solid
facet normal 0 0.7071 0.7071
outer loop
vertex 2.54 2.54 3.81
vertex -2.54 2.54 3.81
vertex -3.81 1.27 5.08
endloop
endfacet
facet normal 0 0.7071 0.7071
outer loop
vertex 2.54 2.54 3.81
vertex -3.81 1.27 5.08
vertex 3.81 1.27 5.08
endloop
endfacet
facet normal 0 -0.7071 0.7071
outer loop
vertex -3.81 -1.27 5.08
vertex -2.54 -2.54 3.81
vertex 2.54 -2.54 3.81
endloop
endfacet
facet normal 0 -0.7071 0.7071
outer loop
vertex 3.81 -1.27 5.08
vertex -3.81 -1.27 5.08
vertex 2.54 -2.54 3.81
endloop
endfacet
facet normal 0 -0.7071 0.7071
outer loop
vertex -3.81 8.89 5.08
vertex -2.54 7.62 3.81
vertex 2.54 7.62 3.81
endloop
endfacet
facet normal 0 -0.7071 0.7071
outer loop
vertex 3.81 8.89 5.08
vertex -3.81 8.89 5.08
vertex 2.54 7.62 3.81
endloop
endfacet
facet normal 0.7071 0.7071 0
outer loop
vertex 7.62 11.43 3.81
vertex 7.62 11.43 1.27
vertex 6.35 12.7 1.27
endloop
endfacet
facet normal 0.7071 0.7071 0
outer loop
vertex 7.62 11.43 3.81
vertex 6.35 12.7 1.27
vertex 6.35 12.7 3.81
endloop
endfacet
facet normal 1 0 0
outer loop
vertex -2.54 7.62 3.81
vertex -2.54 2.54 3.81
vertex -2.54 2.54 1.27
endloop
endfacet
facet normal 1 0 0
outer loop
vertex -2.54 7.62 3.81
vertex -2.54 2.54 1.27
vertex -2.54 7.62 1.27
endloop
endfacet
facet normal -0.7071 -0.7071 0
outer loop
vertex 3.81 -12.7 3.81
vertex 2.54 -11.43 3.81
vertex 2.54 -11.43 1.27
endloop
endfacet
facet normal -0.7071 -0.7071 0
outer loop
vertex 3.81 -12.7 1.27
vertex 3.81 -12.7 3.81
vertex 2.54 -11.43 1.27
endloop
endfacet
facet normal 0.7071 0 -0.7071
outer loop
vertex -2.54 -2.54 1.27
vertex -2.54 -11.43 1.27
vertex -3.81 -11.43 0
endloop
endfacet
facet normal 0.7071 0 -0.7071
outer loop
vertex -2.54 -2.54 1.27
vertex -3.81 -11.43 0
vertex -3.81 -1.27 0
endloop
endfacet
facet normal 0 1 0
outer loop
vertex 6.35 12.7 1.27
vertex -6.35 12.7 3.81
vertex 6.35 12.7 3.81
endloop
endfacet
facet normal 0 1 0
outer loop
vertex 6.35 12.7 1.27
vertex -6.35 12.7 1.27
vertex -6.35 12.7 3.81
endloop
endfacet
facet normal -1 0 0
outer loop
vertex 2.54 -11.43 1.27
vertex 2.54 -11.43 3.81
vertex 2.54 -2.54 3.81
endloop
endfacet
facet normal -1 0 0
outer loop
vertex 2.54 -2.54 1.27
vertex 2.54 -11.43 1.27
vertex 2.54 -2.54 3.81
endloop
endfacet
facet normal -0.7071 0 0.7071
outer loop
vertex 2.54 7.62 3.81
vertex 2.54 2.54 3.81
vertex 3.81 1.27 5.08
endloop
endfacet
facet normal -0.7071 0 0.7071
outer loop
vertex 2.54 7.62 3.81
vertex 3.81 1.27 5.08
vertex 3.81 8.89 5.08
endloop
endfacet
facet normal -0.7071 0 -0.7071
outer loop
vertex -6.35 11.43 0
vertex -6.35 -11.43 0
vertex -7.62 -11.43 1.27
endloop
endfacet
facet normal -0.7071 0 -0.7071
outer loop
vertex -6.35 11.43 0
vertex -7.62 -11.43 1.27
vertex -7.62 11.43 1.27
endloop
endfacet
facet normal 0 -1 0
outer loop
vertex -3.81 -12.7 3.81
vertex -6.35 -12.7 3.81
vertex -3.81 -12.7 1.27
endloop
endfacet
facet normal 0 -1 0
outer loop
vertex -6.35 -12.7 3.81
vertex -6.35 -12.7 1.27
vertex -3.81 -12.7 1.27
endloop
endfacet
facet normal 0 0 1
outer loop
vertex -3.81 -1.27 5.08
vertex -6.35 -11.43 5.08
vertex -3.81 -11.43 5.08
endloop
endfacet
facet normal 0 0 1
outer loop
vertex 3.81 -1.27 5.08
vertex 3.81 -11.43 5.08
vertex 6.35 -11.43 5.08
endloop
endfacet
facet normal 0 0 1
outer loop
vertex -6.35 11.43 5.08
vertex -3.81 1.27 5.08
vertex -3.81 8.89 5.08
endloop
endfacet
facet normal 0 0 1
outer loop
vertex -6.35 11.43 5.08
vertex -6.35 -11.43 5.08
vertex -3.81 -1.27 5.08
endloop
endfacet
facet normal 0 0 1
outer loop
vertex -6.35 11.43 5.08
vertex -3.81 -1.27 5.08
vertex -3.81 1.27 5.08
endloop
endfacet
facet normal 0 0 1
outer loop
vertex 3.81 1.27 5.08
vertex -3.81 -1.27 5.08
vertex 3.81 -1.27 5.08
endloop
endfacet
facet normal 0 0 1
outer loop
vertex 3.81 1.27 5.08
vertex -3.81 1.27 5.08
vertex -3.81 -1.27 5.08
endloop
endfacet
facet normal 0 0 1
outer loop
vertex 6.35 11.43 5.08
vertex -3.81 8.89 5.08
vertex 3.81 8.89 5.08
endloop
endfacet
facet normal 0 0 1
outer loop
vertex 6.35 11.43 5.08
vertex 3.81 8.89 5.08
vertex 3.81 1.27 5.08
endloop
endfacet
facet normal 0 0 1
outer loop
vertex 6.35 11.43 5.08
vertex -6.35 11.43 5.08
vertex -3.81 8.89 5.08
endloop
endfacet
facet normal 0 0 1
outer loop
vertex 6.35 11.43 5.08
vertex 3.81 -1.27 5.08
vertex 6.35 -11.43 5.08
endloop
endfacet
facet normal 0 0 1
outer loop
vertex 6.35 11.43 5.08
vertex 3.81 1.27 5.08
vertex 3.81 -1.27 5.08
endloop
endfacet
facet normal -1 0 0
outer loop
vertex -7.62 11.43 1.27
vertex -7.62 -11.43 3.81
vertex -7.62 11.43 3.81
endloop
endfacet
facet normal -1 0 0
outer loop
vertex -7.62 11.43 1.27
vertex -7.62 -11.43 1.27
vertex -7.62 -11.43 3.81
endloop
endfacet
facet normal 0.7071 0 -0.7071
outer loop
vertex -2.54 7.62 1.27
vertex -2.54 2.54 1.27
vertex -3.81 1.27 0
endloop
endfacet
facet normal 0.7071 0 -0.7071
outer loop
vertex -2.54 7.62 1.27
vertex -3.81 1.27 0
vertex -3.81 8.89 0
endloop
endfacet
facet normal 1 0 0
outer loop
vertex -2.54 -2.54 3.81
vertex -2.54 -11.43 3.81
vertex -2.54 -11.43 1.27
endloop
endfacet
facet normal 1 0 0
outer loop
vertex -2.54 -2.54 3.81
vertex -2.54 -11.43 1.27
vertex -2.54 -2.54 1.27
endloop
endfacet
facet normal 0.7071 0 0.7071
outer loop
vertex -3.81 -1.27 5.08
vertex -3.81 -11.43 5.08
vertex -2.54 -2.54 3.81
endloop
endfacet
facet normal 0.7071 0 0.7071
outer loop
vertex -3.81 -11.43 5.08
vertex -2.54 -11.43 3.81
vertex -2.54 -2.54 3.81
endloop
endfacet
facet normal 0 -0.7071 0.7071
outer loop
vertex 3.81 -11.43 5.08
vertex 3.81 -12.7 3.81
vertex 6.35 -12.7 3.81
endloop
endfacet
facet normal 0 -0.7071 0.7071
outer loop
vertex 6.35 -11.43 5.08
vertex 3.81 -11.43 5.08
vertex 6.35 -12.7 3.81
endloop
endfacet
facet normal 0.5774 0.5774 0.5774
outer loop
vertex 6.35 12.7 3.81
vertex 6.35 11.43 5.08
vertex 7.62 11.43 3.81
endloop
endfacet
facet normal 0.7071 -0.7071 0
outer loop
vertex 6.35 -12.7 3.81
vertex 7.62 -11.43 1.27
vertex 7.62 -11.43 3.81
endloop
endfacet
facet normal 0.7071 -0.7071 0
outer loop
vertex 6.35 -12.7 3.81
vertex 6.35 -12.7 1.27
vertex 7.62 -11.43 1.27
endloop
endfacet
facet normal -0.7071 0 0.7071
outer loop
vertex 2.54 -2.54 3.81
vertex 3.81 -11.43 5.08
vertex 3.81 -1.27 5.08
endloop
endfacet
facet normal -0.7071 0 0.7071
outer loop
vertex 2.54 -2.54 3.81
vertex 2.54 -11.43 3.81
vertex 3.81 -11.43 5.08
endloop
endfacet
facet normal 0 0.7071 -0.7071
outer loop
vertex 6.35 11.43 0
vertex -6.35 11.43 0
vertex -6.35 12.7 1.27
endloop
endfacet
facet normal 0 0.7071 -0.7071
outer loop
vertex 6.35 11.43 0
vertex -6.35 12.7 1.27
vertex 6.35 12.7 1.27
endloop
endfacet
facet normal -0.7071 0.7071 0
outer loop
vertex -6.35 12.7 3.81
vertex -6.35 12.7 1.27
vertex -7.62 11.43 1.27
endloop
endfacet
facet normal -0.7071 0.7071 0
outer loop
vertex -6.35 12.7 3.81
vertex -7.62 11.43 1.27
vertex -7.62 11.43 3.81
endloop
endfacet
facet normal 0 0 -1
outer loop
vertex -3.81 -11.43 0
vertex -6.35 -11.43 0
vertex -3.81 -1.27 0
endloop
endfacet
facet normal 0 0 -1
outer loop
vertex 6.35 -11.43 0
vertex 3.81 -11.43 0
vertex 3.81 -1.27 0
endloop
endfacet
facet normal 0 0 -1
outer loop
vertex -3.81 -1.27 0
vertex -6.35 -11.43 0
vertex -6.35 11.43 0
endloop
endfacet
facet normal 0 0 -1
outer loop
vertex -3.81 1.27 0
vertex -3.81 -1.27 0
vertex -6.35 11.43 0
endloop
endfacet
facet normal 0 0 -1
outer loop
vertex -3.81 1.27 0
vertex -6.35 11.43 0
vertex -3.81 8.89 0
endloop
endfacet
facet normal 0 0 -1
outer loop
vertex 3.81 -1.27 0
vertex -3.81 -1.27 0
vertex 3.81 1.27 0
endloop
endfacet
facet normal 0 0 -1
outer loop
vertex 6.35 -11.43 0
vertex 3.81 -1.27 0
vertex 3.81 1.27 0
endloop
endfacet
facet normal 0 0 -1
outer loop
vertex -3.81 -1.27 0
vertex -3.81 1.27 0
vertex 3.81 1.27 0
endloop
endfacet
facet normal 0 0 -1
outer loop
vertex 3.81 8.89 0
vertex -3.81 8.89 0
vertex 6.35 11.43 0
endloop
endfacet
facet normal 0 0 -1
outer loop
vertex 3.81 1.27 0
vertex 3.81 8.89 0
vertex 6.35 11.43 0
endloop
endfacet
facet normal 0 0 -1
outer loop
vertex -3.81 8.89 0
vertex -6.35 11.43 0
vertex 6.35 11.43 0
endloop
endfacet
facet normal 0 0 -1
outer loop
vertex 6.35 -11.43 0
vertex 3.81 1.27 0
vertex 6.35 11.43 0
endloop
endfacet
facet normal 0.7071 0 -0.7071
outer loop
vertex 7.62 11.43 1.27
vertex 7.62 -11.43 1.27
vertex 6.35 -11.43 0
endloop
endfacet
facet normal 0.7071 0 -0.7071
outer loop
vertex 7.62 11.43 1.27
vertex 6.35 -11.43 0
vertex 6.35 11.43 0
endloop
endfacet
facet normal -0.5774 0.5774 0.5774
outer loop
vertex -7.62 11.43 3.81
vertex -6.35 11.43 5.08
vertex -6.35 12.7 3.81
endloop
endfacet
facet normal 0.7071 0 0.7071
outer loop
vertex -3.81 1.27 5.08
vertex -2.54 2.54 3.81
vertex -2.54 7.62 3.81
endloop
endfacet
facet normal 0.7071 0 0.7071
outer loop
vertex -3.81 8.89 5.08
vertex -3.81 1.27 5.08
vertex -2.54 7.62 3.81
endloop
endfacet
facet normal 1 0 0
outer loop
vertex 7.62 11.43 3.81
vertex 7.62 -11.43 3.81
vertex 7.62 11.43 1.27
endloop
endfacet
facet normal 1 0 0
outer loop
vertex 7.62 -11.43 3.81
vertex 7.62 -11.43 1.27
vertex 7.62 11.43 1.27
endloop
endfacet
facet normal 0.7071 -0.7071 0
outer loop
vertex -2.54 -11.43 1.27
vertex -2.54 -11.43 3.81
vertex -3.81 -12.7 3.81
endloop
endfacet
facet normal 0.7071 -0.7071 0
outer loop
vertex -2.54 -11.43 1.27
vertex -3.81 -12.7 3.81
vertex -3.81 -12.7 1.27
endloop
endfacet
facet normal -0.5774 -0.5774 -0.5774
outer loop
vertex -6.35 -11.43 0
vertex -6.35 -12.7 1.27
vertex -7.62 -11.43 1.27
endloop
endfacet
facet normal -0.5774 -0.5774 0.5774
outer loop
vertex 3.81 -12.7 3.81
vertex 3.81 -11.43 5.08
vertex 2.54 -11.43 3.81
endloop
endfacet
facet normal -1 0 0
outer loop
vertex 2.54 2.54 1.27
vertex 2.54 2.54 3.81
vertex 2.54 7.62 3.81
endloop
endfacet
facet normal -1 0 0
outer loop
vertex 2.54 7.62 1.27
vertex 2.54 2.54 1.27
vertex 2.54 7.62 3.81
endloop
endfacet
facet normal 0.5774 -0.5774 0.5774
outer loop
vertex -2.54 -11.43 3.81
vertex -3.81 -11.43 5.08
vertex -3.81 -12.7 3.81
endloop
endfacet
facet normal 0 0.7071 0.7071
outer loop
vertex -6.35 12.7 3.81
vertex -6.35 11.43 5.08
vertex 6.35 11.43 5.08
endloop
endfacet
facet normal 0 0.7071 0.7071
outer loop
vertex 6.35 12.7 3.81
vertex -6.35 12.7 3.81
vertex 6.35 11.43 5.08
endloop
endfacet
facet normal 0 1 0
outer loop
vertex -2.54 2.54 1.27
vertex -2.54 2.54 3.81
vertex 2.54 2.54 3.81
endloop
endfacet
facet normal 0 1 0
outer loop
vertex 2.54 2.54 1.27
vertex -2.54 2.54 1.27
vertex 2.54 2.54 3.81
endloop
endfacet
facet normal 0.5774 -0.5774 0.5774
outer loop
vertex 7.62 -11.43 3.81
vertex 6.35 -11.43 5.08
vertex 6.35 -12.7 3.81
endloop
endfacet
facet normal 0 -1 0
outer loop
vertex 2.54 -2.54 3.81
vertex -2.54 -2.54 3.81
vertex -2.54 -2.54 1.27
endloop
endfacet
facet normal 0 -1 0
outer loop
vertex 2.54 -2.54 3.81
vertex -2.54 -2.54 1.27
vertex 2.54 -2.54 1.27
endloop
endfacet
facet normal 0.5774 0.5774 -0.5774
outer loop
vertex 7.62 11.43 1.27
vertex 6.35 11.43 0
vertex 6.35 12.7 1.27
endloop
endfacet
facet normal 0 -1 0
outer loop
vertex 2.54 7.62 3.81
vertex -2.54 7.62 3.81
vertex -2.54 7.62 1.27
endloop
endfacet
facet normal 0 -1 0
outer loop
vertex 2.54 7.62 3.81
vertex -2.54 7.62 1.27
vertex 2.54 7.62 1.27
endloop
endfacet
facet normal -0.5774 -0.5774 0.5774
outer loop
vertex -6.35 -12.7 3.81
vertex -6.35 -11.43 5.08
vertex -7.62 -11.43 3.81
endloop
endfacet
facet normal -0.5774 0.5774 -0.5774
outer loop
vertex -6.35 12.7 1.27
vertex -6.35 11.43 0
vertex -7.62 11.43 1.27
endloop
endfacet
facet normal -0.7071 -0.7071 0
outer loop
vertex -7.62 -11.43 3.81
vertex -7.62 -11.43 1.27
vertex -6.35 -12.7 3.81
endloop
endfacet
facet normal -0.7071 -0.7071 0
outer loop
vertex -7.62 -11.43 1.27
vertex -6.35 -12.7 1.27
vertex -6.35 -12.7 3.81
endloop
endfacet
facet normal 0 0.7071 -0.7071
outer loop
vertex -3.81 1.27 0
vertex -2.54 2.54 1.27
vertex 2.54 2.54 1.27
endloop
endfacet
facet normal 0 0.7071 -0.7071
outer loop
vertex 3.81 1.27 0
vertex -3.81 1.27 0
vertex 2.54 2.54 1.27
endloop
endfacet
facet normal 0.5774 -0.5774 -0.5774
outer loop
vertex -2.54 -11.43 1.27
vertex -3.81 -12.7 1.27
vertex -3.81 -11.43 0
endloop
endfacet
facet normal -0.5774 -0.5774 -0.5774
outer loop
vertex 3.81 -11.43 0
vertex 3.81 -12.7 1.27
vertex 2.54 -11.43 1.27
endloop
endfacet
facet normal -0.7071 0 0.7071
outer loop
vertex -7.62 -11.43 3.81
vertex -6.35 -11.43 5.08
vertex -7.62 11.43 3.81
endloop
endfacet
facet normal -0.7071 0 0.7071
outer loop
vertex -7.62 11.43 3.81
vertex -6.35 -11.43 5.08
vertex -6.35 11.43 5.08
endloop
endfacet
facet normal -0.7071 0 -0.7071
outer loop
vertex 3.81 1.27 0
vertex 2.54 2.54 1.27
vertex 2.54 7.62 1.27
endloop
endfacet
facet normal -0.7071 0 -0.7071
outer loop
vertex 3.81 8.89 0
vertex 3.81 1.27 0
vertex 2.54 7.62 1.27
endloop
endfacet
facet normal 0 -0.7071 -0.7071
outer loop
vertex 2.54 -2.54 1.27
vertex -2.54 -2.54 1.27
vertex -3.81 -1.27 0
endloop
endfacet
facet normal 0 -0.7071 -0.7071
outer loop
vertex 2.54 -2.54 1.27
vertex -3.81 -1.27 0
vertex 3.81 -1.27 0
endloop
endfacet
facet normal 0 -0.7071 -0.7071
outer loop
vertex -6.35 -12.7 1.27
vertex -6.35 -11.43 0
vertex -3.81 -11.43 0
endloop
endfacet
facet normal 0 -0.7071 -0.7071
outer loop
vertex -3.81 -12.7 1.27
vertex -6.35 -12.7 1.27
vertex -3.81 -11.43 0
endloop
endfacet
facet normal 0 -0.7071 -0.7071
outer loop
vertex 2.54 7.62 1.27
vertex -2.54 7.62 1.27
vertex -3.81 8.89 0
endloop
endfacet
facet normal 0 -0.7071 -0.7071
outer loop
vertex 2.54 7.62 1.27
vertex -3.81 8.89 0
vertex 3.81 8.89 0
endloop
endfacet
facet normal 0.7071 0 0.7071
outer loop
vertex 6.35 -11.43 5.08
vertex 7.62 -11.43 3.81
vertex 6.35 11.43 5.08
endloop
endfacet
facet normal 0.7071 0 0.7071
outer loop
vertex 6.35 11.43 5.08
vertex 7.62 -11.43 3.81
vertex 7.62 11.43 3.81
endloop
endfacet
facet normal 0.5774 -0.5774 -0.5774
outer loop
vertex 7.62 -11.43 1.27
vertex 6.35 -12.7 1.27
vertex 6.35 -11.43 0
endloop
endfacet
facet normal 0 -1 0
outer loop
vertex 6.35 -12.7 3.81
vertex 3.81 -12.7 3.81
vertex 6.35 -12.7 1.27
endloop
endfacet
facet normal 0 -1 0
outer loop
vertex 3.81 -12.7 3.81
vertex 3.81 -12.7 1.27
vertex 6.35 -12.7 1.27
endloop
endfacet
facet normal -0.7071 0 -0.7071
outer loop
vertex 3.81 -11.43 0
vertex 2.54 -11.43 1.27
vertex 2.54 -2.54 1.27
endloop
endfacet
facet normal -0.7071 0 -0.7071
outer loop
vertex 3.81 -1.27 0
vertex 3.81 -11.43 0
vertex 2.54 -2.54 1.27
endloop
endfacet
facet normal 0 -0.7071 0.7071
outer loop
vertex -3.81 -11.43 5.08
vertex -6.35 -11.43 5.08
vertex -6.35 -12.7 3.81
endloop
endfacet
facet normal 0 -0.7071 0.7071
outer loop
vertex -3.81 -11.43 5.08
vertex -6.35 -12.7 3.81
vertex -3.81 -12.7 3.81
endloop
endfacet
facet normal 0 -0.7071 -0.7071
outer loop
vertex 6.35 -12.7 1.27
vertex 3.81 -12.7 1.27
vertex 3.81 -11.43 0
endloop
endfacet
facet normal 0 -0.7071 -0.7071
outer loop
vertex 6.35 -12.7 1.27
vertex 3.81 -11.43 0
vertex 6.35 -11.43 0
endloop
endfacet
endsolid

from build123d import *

# Parameters (mm, degrees)
F0_W     = 15.24
F0_H     = 25.4
F1_DEPTH = 5.08
F2_W     = 5.08
F2_H     = 5.08
F2_H_2   = 10.16
F3_DEPTH = 5.08
F4_SIZE  = 1.27


with BuildPart() as f1:
    # F0 (on Top) → F1 (new body)
    with BuildSketch(Plane.XY):
        Rectangle(F0_W, F0_H)
    extrude(amount=F1_DEPTH)

    # F2 (on face) → F3 (cut)
    with BuildSketch(Plane.XY.offset(5.08)):
        with Locations((0, 5.08)):
            Rectangle(F2_W, F2_H)
        with Locations((0, -7.62)):
            Rectangle(F2_W, F2_H_2)
    extrude(amount=-F3_DEPTH, mode=Mode.SUBTRACT)

    # F4
    f4_edges = [f1.edges().sort_by_distance(p)[0] for p in [
        (0, 7.62, 5.08),
        (0, 7.62, 0),
        (-2.54, 5.08, 5.08),
        (0, 2.54, 5.08),
        (2.54, 5.08, 5.08),
        (0, -2.54, 5.08),
        (-2.54, -7.62, 5.08),
        (2.54, -7.62, 5.08),
        (-7.62, 0, 5.08),
        (7.62, 0, 5.08),
        (0, 12.7, 5.08),
        (-5.08, -12.7, 5.08),
        (5.08, -12.7, 5.08),
        (-2.54, -12.7, 2.54),
        (2.54, -12.7, 2.54),
        (7.62, -12.7, 2.54),
        (-7.62, -12.7, 2.54),
        (-5.08, -12.7, 0),
        (5.08, -12.7, 0),
        (-7.62, 0, 0),
        (7.62, 0, 0),
        (-2.54, -7.62, 0),
        (2.54, -7.62, 0),
        (0, -2.54, 0),
        (0, 12.7, 0),
        (-2.54, 5.08, 0),
        (0, 2.54, 0),
        (2.54, 5.08, 0),
        (-7.62, 12.7, 2.54),
        (7.62, 12.7, 2.54),
    ]]
    chamfer(f4_edges, length=F4_SIZE)


solid = f1.part
